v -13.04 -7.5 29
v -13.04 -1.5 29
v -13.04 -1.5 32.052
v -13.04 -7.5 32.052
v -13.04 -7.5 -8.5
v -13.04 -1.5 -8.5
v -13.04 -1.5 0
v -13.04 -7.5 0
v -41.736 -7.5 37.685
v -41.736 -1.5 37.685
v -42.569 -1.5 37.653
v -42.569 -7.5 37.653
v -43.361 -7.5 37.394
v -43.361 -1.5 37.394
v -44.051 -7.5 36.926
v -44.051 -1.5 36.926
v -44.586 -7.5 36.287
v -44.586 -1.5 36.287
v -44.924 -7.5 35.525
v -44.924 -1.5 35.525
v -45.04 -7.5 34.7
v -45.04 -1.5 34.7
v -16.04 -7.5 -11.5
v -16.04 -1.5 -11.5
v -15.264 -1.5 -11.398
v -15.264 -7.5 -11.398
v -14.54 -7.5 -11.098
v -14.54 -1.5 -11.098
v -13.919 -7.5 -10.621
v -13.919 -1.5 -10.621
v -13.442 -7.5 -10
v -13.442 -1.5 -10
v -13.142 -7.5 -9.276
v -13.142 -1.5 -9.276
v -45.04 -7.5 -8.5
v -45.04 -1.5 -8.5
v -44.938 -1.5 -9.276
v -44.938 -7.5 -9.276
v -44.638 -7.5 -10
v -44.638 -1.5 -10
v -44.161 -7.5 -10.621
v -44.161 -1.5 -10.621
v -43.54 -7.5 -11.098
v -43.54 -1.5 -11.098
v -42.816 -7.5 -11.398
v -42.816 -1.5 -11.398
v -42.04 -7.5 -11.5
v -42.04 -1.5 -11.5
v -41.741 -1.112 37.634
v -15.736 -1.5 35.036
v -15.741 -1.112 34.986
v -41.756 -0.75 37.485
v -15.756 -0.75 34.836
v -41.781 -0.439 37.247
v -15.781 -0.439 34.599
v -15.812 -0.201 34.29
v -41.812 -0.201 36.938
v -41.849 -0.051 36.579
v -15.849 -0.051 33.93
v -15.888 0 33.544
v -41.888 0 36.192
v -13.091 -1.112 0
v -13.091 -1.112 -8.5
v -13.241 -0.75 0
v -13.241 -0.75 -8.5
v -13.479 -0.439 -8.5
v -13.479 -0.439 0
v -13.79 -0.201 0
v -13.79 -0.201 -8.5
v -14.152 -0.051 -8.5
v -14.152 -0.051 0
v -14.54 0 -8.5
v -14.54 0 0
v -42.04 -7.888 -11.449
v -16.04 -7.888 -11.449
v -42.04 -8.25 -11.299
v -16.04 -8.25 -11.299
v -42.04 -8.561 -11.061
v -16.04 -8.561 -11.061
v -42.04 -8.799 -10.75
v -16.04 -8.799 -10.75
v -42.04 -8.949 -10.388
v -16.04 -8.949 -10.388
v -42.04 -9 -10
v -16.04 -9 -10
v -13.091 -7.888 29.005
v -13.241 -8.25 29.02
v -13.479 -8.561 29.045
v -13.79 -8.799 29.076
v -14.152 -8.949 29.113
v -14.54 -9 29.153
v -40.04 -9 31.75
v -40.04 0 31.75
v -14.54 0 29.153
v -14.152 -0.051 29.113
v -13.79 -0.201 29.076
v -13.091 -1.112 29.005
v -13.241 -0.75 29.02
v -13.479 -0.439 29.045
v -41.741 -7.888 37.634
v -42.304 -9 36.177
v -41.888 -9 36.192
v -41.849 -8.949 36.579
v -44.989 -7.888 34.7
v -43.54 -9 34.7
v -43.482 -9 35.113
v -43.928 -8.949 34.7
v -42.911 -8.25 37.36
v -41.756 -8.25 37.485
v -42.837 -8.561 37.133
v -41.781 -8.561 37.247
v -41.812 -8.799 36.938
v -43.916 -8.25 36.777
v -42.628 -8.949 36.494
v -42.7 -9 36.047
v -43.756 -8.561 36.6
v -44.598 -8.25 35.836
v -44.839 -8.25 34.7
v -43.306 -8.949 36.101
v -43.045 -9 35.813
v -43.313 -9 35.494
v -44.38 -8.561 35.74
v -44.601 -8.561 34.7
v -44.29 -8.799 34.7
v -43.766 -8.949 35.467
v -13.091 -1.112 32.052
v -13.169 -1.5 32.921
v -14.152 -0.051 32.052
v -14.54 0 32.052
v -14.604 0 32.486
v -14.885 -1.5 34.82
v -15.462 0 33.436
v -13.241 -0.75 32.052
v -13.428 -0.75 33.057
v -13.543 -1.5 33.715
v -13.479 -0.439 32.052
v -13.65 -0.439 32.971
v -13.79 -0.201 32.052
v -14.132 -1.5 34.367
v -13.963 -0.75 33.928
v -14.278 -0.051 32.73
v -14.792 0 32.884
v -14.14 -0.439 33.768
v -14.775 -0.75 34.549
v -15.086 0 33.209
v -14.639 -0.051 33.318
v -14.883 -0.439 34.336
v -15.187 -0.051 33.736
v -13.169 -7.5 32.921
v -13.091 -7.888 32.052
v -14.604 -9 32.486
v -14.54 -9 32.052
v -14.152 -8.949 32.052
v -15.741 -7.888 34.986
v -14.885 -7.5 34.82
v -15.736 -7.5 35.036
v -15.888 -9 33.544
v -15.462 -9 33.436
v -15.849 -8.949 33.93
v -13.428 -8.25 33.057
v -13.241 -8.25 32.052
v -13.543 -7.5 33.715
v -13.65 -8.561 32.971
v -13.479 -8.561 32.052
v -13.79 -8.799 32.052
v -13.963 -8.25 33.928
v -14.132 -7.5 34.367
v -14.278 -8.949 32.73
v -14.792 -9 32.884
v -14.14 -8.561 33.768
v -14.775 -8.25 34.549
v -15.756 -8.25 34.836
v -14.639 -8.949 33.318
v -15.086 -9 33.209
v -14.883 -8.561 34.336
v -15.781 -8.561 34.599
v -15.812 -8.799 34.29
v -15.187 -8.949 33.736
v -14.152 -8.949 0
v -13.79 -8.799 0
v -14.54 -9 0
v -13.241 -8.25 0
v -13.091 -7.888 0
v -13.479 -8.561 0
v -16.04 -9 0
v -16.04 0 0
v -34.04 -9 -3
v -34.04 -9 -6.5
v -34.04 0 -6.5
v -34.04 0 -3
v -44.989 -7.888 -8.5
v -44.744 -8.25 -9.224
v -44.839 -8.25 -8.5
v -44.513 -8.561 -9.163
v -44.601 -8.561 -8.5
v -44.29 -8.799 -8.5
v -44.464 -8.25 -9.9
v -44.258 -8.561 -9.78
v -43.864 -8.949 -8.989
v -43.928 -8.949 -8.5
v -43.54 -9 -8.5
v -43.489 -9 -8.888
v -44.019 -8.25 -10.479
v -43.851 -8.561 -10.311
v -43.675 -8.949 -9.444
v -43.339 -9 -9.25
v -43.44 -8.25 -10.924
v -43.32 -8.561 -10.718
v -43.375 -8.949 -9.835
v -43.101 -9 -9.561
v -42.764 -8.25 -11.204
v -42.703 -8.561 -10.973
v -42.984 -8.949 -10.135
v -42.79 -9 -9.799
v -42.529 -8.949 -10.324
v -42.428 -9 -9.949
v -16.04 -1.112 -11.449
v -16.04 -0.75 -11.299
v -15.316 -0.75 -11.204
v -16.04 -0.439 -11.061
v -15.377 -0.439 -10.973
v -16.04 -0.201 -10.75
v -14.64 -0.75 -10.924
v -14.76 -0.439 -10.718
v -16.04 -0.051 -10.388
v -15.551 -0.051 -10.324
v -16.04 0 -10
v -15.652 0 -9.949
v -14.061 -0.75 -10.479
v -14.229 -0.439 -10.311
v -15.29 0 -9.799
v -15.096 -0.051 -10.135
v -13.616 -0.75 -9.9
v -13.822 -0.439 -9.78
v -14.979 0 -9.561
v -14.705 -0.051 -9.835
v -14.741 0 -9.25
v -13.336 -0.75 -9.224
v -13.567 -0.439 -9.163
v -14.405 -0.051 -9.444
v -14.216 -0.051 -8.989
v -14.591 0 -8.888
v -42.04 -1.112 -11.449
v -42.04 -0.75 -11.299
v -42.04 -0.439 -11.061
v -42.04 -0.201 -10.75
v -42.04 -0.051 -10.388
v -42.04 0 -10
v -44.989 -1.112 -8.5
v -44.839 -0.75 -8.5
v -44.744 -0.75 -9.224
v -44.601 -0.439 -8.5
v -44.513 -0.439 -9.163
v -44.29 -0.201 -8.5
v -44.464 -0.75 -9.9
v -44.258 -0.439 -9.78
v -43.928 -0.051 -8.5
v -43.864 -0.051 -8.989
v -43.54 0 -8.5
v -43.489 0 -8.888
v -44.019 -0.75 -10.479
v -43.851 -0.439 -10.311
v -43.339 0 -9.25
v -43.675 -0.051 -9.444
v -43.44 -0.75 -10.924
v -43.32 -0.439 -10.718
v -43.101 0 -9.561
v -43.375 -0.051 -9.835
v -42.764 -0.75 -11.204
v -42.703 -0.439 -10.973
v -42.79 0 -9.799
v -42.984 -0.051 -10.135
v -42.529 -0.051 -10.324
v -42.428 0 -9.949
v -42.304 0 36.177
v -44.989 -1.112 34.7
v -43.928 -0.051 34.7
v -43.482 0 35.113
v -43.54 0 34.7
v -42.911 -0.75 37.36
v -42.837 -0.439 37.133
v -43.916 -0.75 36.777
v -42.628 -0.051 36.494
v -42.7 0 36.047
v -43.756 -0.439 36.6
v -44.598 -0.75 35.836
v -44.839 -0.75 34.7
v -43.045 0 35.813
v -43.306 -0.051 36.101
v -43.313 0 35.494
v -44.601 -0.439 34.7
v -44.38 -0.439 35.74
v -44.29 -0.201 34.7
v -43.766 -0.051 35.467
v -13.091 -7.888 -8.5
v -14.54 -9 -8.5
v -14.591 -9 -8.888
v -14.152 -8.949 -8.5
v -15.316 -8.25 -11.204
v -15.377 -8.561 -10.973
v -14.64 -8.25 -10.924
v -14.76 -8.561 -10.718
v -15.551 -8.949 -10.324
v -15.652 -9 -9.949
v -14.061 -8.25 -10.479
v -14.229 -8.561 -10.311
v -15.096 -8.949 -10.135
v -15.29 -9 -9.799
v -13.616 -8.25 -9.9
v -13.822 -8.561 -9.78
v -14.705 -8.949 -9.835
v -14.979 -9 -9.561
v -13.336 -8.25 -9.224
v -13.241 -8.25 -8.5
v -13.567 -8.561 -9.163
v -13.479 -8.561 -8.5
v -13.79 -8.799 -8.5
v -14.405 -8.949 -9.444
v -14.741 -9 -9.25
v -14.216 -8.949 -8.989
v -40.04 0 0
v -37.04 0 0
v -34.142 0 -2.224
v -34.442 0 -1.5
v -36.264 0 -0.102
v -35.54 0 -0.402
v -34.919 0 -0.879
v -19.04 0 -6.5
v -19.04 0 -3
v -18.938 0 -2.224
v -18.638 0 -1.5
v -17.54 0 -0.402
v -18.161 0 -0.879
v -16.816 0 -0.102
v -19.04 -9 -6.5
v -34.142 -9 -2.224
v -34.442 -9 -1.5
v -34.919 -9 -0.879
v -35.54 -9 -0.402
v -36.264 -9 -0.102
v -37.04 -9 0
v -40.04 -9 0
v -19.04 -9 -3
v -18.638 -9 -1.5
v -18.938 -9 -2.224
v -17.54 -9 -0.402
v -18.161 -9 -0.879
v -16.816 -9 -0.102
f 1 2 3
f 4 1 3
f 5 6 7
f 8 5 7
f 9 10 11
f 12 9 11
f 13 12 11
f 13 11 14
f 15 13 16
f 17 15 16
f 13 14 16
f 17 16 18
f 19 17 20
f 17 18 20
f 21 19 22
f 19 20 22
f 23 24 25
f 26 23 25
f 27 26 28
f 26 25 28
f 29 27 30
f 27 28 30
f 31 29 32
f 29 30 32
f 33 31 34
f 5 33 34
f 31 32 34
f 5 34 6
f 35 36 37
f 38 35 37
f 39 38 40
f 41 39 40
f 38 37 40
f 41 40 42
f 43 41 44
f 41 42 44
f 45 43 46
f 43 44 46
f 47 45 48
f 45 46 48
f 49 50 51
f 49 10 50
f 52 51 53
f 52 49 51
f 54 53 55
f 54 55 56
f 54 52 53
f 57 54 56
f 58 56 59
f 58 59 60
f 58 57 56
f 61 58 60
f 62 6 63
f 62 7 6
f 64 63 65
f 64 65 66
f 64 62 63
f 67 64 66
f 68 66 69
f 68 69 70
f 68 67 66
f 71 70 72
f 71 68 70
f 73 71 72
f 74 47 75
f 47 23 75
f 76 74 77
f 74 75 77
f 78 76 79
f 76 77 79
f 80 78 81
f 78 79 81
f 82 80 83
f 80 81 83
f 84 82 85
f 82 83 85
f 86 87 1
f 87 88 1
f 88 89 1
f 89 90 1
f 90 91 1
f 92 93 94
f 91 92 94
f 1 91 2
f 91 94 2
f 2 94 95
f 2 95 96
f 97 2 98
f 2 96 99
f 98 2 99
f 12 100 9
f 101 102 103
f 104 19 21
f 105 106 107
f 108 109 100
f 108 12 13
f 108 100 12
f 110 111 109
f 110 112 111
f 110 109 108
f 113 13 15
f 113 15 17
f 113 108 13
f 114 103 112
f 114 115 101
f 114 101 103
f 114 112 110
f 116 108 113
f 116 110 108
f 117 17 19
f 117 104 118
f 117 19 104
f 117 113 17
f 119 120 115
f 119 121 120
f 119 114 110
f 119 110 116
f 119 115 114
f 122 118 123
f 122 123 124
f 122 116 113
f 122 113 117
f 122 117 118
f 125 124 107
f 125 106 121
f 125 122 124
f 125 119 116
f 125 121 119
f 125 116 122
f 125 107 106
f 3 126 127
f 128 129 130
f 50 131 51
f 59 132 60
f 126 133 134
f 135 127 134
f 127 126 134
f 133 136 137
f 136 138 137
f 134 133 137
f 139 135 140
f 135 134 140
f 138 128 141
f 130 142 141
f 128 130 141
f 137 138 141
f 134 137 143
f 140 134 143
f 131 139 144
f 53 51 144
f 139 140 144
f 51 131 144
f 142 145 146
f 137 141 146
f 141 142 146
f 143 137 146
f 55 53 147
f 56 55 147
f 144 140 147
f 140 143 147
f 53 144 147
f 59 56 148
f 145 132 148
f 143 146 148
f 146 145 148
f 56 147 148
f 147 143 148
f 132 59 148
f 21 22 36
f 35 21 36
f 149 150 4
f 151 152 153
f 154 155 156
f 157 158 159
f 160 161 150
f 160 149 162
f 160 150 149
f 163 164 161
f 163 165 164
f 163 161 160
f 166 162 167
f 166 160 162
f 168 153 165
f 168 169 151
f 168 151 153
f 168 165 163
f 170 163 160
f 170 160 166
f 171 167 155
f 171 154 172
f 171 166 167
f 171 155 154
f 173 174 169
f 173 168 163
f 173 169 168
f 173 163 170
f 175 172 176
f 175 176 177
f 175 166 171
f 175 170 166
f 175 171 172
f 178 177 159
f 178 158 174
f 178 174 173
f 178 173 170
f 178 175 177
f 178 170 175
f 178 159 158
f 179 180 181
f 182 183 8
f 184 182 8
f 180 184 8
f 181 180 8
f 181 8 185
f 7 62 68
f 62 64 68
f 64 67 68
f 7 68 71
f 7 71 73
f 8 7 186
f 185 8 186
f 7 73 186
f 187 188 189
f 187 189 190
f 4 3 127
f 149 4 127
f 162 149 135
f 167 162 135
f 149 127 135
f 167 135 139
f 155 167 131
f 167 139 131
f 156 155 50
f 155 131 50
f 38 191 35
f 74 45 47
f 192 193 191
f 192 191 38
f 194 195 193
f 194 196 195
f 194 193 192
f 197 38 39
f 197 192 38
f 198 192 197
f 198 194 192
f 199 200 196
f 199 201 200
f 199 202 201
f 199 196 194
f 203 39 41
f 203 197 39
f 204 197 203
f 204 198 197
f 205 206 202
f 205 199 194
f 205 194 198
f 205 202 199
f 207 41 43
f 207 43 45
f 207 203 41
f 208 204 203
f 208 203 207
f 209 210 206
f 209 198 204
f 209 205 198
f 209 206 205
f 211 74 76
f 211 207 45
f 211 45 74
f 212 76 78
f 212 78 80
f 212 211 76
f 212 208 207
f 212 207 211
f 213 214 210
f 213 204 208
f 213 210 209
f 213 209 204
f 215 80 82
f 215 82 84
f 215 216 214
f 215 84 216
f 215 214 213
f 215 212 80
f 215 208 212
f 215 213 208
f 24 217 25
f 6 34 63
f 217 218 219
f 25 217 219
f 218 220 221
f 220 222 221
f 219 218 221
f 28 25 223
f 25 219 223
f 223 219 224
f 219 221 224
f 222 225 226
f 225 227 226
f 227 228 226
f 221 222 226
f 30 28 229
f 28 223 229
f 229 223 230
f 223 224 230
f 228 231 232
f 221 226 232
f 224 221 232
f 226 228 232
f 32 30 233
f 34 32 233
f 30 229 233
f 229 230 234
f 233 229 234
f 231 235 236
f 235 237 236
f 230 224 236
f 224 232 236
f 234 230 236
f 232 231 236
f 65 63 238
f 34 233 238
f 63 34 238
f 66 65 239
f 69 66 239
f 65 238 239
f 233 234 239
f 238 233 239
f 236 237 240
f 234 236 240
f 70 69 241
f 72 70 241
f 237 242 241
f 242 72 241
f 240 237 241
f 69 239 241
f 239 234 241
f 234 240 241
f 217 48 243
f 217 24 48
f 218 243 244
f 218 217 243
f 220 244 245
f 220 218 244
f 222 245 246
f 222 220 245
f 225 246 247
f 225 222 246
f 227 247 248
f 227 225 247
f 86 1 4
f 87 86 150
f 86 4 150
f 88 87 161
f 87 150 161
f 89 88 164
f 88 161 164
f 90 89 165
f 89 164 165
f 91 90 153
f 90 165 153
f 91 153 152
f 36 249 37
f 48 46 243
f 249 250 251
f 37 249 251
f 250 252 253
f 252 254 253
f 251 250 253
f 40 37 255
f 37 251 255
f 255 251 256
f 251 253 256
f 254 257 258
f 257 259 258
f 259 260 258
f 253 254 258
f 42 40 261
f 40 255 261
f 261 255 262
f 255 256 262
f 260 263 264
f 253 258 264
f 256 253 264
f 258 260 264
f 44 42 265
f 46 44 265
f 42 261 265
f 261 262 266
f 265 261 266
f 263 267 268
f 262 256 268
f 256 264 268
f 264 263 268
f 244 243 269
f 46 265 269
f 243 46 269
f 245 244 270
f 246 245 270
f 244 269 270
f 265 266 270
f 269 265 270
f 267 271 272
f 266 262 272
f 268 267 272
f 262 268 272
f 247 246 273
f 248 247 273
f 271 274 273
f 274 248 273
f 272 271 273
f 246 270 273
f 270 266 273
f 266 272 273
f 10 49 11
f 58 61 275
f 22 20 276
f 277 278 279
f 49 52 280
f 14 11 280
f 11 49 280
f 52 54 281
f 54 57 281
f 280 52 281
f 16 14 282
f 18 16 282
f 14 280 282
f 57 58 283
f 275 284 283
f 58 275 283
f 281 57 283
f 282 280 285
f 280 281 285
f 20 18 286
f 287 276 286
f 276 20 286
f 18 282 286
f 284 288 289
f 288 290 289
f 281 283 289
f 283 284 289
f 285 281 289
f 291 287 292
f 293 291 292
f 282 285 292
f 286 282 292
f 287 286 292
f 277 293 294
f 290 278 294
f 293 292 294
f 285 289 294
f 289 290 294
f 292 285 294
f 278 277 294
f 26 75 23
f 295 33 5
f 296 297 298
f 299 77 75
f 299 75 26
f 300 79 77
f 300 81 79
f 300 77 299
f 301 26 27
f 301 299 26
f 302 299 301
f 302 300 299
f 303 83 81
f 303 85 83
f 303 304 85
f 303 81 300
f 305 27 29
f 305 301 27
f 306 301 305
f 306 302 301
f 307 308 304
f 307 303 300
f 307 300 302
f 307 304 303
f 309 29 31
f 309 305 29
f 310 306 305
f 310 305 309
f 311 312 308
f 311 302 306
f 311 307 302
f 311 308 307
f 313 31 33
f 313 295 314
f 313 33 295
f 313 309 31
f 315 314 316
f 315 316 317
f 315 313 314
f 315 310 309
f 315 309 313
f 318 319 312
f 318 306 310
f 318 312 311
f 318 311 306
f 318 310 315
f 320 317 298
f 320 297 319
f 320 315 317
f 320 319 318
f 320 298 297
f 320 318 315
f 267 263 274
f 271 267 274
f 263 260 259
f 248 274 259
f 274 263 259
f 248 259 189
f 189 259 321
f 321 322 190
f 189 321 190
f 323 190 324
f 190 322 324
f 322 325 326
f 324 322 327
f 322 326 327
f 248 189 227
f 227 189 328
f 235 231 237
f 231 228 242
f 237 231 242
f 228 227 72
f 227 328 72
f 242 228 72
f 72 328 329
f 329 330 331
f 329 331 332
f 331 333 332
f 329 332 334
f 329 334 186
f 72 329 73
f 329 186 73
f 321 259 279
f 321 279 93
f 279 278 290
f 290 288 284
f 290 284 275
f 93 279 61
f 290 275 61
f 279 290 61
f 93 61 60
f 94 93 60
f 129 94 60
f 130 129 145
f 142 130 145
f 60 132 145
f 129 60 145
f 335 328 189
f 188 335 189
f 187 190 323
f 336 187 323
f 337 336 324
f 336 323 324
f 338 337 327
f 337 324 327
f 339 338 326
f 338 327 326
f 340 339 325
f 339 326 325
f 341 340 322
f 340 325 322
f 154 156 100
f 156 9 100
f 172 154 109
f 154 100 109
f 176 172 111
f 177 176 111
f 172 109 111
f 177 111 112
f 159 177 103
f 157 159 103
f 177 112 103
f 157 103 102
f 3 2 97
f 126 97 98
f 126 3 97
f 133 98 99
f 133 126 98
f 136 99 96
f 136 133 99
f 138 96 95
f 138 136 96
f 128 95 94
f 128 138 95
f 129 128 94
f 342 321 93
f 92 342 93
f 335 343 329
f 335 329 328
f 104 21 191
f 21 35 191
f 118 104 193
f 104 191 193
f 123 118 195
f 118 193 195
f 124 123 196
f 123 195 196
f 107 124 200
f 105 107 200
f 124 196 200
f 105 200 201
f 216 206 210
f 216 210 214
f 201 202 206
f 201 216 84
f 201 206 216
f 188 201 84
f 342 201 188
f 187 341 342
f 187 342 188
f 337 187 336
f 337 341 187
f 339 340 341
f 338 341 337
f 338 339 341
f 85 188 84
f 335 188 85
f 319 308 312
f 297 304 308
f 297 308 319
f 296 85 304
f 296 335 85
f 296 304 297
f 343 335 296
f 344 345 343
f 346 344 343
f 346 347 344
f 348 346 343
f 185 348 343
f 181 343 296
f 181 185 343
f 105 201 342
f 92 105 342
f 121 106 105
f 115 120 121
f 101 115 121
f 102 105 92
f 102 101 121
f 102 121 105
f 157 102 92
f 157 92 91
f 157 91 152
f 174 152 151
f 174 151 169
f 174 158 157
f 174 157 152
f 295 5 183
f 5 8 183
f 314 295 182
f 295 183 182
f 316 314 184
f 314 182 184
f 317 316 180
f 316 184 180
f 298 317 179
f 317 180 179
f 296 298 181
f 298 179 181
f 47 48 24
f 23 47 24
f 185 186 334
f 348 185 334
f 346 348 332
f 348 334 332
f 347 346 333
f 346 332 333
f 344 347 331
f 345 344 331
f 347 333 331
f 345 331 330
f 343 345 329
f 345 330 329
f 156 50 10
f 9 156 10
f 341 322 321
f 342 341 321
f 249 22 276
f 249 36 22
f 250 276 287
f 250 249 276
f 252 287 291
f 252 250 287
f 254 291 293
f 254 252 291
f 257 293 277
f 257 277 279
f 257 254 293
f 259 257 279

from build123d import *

# Parameters (mm, degrees)
F1_DEPTH = 9
F2_R     = 1.5


with BuildPart() as f1:
    # F0 (on Front) → F1 (new body)
    with BuildSketch(Plane.XZ):
        with BuildLine():
            Line((-40.040002, 31.75), (-13.040002, 29))
            Line((-13.040002, 29), (-13.040002, 32.051852))
            ThreePointArc((-13.040002, 32.051852), (-13.8138, 34.062828), (-15.736019, 35.036411))
            Line((-15.736019, 35.036411), (-41.736019, 37.684559))
            ThreePointArc((-41.736019, 37.684559), (-44.050978, 36.926202), (-45.040002, 34.7))
            Line((-45.040002, 34.7), (-45.040002, -8.5))
            ThreePointArc((-45.040002, -8.5), (-44.161322, -10.62132), (-42.040002, -11.5))
            Line((-42.040002, -11.5), (-16.040002, -11.5))
            ThreePointArc((-16.040002, -11.5), (-13.918682, -10.62132), (-13.040002, -8.5))
            Line((-13.040002, -8.5), (-13.040002, 0))
            Line((-13.040002, 0), (-16.040002, 0))
            ThreePointArc((-16.040002, 0), (-18.161322, -0.87868), (-19.040002, -3))
            Line((-19.040002, -3), (-19.040002, -6.5))
            Line((-19.040002, -6.5), (-34.040002, -6.5))
            Line((-34.040002, -6.5), (-34.040002, -3))
            ThreePointArc((-34.040002, -3), (-34.918682, -0.87868), (-37.040002, 0))
            Line((-37.040002, 0), (-40.040002, 0))
            Line((-40.040002, 0), (-40.040002, 31.75))
        make_face()
    extrude(amount=F1_DEPTH)

    # F2
    f2_edges = [f1.edges().sort_by_distance(p)[0] for p in [
        (-29.040002, -9, -11.5),
        (-45.040002, 0, 13.1),
    ]]
    fillet(f2_edges, radius=F2_R)


solid = f1.part
